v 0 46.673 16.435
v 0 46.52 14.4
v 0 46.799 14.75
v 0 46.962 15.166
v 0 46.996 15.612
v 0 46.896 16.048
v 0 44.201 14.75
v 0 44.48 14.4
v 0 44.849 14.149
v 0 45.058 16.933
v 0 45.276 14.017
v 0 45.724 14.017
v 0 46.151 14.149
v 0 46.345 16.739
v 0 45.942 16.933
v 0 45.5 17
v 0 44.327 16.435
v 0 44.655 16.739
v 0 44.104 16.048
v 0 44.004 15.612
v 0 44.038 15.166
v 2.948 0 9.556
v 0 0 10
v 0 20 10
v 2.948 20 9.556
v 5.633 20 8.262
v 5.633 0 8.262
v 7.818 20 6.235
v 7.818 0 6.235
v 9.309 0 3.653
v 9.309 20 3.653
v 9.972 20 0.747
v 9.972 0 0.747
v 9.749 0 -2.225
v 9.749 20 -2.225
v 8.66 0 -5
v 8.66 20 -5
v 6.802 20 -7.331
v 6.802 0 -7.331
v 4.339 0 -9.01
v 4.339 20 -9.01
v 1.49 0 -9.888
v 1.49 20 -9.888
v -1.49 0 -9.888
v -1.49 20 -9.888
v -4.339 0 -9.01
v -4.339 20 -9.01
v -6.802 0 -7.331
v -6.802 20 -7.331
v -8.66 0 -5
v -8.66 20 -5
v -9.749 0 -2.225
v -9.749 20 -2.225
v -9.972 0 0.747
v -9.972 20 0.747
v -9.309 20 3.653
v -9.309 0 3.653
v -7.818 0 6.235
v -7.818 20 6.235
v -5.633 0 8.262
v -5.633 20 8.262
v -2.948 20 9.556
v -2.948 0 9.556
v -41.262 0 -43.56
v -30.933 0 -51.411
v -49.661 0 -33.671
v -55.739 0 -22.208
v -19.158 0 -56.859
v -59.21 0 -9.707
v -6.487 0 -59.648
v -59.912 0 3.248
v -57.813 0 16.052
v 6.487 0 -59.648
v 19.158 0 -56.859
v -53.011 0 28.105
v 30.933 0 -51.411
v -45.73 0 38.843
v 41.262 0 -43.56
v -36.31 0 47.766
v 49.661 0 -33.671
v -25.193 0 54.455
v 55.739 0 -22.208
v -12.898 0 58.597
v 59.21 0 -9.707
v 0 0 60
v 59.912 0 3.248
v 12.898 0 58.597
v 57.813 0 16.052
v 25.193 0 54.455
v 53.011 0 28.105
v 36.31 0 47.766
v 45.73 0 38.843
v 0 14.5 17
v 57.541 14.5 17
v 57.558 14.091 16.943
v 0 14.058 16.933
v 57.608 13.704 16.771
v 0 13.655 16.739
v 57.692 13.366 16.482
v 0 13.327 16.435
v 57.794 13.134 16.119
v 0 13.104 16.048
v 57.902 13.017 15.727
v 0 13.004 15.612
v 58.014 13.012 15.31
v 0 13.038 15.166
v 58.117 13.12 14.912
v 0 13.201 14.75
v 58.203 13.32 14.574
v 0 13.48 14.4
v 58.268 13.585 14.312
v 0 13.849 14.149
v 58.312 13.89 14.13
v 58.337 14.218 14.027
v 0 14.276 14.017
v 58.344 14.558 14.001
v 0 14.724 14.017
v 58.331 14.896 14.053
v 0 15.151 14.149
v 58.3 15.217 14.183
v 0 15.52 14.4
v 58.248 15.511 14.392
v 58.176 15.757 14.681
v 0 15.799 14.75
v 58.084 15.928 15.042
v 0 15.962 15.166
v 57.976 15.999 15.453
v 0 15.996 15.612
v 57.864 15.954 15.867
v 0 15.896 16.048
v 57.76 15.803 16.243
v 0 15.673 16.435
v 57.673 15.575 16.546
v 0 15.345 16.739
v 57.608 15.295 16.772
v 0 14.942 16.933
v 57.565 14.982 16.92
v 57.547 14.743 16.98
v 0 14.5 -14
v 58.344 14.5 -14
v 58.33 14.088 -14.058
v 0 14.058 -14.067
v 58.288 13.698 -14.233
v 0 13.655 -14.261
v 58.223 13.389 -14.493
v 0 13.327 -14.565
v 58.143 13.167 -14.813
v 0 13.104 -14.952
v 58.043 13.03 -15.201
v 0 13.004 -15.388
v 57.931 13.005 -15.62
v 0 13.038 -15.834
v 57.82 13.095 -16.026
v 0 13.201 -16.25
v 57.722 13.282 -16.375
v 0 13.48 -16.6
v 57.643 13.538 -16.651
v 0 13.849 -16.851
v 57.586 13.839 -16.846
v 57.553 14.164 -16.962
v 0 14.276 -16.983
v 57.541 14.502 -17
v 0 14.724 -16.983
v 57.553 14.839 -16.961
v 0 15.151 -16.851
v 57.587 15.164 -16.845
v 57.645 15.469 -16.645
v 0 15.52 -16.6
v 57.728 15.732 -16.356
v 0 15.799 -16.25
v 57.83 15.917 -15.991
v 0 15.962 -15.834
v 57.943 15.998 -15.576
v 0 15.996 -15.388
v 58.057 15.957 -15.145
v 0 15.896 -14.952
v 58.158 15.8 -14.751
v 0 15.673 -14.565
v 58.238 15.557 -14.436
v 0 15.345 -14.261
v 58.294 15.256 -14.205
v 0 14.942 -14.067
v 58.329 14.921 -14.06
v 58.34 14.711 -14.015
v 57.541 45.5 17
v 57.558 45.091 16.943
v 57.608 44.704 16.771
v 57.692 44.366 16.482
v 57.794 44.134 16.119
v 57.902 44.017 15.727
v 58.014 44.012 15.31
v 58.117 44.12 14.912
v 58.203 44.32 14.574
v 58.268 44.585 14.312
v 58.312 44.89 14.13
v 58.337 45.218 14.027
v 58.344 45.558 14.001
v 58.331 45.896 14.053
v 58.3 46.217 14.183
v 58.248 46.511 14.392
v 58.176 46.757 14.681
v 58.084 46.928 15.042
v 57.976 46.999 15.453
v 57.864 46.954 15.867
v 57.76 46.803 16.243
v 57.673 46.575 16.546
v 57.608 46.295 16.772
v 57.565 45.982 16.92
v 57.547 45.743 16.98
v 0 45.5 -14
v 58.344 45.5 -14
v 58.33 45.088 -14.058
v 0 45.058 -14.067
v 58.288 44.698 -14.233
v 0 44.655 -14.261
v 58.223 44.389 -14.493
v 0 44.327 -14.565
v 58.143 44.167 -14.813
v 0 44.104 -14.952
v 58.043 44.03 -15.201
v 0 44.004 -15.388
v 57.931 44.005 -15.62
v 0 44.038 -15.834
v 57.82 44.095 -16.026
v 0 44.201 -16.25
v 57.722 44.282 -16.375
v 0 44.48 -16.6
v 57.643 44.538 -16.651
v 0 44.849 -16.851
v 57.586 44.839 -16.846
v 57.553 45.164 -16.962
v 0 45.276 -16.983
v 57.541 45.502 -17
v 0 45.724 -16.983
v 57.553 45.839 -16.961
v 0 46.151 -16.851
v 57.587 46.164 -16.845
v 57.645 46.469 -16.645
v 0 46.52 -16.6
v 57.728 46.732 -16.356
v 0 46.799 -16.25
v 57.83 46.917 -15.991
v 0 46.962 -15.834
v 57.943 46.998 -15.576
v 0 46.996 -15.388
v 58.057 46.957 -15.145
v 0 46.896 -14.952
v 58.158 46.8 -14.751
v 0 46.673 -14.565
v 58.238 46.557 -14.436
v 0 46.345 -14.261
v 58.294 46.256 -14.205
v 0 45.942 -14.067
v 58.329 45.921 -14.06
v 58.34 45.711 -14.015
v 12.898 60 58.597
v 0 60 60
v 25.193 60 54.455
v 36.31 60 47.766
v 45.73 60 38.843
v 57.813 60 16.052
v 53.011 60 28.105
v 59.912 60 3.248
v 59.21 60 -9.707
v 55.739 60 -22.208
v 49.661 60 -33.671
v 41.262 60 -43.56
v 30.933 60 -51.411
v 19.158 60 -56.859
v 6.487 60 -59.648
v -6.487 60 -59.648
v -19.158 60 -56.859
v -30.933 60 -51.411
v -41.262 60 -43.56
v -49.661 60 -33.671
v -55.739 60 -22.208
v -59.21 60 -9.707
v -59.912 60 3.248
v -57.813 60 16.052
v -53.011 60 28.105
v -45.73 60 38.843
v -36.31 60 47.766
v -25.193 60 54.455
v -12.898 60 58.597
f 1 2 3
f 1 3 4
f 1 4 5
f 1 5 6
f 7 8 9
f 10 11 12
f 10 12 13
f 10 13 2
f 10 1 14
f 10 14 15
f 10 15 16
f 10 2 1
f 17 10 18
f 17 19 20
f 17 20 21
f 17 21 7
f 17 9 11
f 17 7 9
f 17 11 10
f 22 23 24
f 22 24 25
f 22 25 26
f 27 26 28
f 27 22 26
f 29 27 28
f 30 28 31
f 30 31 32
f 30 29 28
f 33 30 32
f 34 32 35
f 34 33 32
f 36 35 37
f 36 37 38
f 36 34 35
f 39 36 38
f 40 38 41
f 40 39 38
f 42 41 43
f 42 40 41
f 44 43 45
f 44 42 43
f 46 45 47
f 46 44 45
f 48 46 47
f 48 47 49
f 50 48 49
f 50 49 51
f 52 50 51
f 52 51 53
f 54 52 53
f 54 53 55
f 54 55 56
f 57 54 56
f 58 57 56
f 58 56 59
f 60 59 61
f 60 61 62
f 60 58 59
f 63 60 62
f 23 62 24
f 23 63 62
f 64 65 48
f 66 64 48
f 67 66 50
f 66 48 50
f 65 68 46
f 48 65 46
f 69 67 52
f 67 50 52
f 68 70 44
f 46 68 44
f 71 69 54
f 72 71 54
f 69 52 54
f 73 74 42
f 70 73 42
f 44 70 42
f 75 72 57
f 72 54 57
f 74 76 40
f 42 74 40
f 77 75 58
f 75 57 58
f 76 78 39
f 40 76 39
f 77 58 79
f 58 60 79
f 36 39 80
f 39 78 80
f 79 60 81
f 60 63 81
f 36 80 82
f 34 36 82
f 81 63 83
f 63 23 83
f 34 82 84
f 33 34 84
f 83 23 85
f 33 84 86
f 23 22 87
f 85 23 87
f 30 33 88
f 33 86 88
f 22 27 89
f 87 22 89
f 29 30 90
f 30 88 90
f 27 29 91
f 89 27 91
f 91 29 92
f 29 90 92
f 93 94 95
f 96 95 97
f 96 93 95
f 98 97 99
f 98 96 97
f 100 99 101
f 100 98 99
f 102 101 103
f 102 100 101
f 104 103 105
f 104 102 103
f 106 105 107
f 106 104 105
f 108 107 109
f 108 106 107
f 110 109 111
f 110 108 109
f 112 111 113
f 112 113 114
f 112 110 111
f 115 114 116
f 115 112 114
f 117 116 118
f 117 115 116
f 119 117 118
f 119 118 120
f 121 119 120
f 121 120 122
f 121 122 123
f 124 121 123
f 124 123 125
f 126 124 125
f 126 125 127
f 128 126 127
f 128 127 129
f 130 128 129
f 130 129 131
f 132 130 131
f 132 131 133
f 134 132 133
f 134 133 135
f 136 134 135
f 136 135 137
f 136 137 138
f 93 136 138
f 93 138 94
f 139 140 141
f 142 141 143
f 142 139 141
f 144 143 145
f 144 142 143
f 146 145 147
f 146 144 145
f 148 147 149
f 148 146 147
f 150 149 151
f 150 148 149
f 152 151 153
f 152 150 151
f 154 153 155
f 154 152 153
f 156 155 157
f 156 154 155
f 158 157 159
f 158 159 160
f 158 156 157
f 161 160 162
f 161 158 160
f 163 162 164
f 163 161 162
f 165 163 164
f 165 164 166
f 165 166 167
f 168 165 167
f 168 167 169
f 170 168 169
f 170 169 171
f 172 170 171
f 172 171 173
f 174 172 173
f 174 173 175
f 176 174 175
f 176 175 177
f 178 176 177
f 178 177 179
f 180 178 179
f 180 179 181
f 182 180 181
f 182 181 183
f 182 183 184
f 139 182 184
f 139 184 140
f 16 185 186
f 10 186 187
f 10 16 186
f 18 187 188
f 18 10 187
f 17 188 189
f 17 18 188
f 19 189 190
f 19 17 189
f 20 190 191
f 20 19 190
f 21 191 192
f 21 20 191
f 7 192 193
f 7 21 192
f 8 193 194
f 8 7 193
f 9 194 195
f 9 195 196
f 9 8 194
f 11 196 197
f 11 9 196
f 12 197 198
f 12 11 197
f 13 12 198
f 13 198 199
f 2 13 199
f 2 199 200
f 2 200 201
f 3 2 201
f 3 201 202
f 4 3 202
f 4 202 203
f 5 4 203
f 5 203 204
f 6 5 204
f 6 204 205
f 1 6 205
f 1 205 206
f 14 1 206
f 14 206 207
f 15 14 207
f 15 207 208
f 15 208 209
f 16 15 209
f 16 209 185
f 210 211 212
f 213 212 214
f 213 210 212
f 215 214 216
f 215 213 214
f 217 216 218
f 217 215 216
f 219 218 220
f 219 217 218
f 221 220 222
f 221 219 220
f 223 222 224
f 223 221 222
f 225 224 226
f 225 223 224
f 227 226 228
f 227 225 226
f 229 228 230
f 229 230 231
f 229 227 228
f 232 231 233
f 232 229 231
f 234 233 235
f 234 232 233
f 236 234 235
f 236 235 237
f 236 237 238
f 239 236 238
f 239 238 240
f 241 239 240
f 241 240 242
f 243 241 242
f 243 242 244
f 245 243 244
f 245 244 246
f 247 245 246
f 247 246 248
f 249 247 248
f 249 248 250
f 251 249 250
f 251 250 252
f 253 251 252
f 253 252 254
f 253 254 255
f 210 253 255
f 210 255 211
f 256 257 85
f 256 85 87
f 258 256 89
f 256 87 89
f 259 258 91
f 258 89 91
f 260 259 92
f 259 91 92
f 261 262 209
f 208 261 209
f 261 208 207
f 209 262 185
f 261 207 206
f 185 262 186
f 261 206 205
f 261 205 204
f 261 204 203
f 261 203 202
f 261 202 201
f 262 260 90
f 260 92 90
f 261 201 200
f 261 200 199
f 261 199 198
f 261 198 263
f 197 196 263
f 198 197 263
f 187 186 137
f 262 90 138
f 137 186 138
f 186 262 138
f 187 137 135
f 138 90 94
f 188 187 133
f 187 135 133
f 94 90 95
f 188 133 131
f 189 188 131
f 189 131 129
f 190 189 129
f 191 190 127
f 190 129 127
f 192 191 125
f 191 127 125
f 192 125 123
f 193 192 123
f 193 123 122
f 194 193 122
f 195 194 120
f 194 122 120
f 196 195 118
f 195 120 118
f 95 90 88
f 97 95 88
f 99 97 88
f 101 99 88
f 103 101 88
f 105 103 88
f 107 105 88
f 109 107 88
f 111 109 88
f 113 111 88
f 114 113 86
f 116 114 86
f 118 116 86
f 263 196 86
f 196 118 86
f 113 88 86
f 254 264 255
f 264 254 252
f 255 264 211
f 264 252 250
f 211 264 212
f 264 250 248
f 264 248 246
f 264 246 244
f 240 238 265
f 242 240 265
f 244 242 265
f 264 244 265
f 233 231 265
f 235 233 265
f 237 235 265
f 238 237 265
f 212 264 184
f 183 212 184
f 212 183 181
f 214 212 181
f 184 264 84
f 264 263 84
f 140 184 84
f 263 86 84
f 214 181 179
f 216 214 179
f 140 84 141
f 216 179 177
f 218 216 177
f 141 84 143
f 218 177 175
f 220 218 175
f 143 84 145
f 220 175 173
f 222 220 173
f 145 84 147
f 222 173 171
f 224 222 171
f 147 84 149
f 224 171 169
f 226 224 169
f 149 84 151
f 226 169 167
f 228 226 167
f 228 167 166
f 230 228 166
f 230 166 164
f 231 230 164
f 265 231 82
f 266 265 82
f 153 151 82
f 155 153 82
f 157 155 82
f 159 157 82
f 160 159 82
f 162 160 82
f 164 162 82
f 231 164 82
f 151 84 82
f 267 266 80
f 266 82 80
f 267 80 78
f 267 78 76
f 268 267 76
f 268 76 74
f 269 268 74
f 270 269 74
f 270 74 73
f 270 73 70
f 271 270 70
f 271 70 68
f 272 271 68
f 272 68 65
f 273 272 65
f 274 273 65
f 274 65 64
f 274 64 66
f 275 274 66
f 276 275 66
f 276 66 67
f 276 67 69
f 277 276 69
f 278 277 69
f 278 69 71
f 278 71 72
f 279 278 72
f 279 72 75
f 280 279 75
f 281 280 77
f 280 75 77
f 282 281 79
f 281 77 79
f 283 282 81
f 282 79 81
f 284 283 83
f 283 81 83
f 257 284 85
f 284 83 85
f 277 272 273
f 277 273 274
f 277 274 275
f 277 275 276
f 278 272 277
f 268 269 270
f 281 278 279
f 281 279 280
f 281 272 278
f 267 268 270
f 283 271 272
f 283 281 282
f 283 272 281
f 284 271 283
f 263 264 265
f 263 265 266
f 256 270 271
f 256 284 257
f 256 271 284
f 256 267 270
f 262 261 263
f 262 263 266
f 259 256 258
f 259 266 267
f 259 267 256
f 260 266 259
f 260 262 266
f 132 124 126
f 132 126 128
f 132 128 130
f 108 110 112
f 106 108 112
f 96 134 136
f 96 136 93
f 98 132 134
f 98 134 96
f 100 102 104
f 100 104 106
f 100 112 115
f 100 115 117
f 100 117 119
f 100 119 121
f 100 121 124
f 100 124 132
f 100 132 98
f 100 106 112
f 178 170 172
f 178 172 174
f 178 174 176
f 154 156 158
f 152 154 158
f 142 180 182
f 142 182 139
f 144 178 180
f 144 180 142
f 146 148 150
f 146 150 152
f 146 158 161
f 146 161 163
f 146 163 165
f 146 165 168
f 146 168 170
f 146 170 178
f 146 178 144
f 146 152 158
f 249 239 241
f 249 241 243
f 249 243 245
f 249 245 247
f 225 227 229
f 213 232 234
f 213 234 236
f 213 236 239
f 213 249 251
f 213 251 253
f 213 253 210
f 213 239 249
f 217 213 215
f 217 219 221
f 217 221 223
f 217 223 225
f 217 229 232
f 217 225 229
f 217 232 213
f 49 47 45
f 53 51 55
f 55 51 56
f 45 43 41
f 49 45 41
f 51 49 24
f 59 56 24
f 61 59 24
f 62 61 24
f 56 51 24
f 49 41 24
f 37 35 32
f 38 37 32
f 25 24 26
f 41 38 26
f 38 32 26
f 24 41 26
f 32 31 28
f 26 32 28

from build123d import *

# Parameters (mm, degrees)
SKETCH1_R           = 60
BOSS_EXTRUDE1_DEPTH = 60
SKETCH2_R           = 10
CUT_EXTRUDE1_DEPTH  = 20
SKETCH3_R           = 1.5
CUT_EXTRUDE2_DEPTH  = 100


with BuildPart() as part:
    # Sketch1 → Boss-Extrude1 (new body)
    with BuildSketch(Plane(origin=(0, 0, 0), x_dir=(1, 0, 0), z_dir=(0, 1, 0))):
        Circle(SKETCH1_R)
    extrude(amount=BOSS_EXTRUDE1_DEPTH)

    # Sketch2 → Cut-Extrude1 (cut)
    with BuildSketch(Plane(origin=(0, 0, 0), x_dir=(1, 0, 0), z_dir=(0, 1, 0))):
        Circle(SKETCH2_R)
    extrude(amount=CUT_EXTRUDE1_DEPTH, mode=Mode.SUBTRACT)

    # Sketch3 → Cut-Extrude2 (cut)
    with BuildSketch(Plane(origin=(0, 0, 0), x_dir=(0, 0, -1), z_dir=(1, 0, 0))):
        with Locations((-15.5, 45.5)):
            Circle(SKETCH3_R)
        with Locations((-15.5, 14.5)):
            Circle(SKETCH3_R)
        with Locations((15.5, 14.5)):
            Circle(SKETCH3_R)
        with Locations((15.5, 45.5)):
            Circle(SKETCH3_R)
    extrude(amount=CUT_EXTRUDE2_DEPTH, mode=Mode.SUBTRACT)


solid = part.part
